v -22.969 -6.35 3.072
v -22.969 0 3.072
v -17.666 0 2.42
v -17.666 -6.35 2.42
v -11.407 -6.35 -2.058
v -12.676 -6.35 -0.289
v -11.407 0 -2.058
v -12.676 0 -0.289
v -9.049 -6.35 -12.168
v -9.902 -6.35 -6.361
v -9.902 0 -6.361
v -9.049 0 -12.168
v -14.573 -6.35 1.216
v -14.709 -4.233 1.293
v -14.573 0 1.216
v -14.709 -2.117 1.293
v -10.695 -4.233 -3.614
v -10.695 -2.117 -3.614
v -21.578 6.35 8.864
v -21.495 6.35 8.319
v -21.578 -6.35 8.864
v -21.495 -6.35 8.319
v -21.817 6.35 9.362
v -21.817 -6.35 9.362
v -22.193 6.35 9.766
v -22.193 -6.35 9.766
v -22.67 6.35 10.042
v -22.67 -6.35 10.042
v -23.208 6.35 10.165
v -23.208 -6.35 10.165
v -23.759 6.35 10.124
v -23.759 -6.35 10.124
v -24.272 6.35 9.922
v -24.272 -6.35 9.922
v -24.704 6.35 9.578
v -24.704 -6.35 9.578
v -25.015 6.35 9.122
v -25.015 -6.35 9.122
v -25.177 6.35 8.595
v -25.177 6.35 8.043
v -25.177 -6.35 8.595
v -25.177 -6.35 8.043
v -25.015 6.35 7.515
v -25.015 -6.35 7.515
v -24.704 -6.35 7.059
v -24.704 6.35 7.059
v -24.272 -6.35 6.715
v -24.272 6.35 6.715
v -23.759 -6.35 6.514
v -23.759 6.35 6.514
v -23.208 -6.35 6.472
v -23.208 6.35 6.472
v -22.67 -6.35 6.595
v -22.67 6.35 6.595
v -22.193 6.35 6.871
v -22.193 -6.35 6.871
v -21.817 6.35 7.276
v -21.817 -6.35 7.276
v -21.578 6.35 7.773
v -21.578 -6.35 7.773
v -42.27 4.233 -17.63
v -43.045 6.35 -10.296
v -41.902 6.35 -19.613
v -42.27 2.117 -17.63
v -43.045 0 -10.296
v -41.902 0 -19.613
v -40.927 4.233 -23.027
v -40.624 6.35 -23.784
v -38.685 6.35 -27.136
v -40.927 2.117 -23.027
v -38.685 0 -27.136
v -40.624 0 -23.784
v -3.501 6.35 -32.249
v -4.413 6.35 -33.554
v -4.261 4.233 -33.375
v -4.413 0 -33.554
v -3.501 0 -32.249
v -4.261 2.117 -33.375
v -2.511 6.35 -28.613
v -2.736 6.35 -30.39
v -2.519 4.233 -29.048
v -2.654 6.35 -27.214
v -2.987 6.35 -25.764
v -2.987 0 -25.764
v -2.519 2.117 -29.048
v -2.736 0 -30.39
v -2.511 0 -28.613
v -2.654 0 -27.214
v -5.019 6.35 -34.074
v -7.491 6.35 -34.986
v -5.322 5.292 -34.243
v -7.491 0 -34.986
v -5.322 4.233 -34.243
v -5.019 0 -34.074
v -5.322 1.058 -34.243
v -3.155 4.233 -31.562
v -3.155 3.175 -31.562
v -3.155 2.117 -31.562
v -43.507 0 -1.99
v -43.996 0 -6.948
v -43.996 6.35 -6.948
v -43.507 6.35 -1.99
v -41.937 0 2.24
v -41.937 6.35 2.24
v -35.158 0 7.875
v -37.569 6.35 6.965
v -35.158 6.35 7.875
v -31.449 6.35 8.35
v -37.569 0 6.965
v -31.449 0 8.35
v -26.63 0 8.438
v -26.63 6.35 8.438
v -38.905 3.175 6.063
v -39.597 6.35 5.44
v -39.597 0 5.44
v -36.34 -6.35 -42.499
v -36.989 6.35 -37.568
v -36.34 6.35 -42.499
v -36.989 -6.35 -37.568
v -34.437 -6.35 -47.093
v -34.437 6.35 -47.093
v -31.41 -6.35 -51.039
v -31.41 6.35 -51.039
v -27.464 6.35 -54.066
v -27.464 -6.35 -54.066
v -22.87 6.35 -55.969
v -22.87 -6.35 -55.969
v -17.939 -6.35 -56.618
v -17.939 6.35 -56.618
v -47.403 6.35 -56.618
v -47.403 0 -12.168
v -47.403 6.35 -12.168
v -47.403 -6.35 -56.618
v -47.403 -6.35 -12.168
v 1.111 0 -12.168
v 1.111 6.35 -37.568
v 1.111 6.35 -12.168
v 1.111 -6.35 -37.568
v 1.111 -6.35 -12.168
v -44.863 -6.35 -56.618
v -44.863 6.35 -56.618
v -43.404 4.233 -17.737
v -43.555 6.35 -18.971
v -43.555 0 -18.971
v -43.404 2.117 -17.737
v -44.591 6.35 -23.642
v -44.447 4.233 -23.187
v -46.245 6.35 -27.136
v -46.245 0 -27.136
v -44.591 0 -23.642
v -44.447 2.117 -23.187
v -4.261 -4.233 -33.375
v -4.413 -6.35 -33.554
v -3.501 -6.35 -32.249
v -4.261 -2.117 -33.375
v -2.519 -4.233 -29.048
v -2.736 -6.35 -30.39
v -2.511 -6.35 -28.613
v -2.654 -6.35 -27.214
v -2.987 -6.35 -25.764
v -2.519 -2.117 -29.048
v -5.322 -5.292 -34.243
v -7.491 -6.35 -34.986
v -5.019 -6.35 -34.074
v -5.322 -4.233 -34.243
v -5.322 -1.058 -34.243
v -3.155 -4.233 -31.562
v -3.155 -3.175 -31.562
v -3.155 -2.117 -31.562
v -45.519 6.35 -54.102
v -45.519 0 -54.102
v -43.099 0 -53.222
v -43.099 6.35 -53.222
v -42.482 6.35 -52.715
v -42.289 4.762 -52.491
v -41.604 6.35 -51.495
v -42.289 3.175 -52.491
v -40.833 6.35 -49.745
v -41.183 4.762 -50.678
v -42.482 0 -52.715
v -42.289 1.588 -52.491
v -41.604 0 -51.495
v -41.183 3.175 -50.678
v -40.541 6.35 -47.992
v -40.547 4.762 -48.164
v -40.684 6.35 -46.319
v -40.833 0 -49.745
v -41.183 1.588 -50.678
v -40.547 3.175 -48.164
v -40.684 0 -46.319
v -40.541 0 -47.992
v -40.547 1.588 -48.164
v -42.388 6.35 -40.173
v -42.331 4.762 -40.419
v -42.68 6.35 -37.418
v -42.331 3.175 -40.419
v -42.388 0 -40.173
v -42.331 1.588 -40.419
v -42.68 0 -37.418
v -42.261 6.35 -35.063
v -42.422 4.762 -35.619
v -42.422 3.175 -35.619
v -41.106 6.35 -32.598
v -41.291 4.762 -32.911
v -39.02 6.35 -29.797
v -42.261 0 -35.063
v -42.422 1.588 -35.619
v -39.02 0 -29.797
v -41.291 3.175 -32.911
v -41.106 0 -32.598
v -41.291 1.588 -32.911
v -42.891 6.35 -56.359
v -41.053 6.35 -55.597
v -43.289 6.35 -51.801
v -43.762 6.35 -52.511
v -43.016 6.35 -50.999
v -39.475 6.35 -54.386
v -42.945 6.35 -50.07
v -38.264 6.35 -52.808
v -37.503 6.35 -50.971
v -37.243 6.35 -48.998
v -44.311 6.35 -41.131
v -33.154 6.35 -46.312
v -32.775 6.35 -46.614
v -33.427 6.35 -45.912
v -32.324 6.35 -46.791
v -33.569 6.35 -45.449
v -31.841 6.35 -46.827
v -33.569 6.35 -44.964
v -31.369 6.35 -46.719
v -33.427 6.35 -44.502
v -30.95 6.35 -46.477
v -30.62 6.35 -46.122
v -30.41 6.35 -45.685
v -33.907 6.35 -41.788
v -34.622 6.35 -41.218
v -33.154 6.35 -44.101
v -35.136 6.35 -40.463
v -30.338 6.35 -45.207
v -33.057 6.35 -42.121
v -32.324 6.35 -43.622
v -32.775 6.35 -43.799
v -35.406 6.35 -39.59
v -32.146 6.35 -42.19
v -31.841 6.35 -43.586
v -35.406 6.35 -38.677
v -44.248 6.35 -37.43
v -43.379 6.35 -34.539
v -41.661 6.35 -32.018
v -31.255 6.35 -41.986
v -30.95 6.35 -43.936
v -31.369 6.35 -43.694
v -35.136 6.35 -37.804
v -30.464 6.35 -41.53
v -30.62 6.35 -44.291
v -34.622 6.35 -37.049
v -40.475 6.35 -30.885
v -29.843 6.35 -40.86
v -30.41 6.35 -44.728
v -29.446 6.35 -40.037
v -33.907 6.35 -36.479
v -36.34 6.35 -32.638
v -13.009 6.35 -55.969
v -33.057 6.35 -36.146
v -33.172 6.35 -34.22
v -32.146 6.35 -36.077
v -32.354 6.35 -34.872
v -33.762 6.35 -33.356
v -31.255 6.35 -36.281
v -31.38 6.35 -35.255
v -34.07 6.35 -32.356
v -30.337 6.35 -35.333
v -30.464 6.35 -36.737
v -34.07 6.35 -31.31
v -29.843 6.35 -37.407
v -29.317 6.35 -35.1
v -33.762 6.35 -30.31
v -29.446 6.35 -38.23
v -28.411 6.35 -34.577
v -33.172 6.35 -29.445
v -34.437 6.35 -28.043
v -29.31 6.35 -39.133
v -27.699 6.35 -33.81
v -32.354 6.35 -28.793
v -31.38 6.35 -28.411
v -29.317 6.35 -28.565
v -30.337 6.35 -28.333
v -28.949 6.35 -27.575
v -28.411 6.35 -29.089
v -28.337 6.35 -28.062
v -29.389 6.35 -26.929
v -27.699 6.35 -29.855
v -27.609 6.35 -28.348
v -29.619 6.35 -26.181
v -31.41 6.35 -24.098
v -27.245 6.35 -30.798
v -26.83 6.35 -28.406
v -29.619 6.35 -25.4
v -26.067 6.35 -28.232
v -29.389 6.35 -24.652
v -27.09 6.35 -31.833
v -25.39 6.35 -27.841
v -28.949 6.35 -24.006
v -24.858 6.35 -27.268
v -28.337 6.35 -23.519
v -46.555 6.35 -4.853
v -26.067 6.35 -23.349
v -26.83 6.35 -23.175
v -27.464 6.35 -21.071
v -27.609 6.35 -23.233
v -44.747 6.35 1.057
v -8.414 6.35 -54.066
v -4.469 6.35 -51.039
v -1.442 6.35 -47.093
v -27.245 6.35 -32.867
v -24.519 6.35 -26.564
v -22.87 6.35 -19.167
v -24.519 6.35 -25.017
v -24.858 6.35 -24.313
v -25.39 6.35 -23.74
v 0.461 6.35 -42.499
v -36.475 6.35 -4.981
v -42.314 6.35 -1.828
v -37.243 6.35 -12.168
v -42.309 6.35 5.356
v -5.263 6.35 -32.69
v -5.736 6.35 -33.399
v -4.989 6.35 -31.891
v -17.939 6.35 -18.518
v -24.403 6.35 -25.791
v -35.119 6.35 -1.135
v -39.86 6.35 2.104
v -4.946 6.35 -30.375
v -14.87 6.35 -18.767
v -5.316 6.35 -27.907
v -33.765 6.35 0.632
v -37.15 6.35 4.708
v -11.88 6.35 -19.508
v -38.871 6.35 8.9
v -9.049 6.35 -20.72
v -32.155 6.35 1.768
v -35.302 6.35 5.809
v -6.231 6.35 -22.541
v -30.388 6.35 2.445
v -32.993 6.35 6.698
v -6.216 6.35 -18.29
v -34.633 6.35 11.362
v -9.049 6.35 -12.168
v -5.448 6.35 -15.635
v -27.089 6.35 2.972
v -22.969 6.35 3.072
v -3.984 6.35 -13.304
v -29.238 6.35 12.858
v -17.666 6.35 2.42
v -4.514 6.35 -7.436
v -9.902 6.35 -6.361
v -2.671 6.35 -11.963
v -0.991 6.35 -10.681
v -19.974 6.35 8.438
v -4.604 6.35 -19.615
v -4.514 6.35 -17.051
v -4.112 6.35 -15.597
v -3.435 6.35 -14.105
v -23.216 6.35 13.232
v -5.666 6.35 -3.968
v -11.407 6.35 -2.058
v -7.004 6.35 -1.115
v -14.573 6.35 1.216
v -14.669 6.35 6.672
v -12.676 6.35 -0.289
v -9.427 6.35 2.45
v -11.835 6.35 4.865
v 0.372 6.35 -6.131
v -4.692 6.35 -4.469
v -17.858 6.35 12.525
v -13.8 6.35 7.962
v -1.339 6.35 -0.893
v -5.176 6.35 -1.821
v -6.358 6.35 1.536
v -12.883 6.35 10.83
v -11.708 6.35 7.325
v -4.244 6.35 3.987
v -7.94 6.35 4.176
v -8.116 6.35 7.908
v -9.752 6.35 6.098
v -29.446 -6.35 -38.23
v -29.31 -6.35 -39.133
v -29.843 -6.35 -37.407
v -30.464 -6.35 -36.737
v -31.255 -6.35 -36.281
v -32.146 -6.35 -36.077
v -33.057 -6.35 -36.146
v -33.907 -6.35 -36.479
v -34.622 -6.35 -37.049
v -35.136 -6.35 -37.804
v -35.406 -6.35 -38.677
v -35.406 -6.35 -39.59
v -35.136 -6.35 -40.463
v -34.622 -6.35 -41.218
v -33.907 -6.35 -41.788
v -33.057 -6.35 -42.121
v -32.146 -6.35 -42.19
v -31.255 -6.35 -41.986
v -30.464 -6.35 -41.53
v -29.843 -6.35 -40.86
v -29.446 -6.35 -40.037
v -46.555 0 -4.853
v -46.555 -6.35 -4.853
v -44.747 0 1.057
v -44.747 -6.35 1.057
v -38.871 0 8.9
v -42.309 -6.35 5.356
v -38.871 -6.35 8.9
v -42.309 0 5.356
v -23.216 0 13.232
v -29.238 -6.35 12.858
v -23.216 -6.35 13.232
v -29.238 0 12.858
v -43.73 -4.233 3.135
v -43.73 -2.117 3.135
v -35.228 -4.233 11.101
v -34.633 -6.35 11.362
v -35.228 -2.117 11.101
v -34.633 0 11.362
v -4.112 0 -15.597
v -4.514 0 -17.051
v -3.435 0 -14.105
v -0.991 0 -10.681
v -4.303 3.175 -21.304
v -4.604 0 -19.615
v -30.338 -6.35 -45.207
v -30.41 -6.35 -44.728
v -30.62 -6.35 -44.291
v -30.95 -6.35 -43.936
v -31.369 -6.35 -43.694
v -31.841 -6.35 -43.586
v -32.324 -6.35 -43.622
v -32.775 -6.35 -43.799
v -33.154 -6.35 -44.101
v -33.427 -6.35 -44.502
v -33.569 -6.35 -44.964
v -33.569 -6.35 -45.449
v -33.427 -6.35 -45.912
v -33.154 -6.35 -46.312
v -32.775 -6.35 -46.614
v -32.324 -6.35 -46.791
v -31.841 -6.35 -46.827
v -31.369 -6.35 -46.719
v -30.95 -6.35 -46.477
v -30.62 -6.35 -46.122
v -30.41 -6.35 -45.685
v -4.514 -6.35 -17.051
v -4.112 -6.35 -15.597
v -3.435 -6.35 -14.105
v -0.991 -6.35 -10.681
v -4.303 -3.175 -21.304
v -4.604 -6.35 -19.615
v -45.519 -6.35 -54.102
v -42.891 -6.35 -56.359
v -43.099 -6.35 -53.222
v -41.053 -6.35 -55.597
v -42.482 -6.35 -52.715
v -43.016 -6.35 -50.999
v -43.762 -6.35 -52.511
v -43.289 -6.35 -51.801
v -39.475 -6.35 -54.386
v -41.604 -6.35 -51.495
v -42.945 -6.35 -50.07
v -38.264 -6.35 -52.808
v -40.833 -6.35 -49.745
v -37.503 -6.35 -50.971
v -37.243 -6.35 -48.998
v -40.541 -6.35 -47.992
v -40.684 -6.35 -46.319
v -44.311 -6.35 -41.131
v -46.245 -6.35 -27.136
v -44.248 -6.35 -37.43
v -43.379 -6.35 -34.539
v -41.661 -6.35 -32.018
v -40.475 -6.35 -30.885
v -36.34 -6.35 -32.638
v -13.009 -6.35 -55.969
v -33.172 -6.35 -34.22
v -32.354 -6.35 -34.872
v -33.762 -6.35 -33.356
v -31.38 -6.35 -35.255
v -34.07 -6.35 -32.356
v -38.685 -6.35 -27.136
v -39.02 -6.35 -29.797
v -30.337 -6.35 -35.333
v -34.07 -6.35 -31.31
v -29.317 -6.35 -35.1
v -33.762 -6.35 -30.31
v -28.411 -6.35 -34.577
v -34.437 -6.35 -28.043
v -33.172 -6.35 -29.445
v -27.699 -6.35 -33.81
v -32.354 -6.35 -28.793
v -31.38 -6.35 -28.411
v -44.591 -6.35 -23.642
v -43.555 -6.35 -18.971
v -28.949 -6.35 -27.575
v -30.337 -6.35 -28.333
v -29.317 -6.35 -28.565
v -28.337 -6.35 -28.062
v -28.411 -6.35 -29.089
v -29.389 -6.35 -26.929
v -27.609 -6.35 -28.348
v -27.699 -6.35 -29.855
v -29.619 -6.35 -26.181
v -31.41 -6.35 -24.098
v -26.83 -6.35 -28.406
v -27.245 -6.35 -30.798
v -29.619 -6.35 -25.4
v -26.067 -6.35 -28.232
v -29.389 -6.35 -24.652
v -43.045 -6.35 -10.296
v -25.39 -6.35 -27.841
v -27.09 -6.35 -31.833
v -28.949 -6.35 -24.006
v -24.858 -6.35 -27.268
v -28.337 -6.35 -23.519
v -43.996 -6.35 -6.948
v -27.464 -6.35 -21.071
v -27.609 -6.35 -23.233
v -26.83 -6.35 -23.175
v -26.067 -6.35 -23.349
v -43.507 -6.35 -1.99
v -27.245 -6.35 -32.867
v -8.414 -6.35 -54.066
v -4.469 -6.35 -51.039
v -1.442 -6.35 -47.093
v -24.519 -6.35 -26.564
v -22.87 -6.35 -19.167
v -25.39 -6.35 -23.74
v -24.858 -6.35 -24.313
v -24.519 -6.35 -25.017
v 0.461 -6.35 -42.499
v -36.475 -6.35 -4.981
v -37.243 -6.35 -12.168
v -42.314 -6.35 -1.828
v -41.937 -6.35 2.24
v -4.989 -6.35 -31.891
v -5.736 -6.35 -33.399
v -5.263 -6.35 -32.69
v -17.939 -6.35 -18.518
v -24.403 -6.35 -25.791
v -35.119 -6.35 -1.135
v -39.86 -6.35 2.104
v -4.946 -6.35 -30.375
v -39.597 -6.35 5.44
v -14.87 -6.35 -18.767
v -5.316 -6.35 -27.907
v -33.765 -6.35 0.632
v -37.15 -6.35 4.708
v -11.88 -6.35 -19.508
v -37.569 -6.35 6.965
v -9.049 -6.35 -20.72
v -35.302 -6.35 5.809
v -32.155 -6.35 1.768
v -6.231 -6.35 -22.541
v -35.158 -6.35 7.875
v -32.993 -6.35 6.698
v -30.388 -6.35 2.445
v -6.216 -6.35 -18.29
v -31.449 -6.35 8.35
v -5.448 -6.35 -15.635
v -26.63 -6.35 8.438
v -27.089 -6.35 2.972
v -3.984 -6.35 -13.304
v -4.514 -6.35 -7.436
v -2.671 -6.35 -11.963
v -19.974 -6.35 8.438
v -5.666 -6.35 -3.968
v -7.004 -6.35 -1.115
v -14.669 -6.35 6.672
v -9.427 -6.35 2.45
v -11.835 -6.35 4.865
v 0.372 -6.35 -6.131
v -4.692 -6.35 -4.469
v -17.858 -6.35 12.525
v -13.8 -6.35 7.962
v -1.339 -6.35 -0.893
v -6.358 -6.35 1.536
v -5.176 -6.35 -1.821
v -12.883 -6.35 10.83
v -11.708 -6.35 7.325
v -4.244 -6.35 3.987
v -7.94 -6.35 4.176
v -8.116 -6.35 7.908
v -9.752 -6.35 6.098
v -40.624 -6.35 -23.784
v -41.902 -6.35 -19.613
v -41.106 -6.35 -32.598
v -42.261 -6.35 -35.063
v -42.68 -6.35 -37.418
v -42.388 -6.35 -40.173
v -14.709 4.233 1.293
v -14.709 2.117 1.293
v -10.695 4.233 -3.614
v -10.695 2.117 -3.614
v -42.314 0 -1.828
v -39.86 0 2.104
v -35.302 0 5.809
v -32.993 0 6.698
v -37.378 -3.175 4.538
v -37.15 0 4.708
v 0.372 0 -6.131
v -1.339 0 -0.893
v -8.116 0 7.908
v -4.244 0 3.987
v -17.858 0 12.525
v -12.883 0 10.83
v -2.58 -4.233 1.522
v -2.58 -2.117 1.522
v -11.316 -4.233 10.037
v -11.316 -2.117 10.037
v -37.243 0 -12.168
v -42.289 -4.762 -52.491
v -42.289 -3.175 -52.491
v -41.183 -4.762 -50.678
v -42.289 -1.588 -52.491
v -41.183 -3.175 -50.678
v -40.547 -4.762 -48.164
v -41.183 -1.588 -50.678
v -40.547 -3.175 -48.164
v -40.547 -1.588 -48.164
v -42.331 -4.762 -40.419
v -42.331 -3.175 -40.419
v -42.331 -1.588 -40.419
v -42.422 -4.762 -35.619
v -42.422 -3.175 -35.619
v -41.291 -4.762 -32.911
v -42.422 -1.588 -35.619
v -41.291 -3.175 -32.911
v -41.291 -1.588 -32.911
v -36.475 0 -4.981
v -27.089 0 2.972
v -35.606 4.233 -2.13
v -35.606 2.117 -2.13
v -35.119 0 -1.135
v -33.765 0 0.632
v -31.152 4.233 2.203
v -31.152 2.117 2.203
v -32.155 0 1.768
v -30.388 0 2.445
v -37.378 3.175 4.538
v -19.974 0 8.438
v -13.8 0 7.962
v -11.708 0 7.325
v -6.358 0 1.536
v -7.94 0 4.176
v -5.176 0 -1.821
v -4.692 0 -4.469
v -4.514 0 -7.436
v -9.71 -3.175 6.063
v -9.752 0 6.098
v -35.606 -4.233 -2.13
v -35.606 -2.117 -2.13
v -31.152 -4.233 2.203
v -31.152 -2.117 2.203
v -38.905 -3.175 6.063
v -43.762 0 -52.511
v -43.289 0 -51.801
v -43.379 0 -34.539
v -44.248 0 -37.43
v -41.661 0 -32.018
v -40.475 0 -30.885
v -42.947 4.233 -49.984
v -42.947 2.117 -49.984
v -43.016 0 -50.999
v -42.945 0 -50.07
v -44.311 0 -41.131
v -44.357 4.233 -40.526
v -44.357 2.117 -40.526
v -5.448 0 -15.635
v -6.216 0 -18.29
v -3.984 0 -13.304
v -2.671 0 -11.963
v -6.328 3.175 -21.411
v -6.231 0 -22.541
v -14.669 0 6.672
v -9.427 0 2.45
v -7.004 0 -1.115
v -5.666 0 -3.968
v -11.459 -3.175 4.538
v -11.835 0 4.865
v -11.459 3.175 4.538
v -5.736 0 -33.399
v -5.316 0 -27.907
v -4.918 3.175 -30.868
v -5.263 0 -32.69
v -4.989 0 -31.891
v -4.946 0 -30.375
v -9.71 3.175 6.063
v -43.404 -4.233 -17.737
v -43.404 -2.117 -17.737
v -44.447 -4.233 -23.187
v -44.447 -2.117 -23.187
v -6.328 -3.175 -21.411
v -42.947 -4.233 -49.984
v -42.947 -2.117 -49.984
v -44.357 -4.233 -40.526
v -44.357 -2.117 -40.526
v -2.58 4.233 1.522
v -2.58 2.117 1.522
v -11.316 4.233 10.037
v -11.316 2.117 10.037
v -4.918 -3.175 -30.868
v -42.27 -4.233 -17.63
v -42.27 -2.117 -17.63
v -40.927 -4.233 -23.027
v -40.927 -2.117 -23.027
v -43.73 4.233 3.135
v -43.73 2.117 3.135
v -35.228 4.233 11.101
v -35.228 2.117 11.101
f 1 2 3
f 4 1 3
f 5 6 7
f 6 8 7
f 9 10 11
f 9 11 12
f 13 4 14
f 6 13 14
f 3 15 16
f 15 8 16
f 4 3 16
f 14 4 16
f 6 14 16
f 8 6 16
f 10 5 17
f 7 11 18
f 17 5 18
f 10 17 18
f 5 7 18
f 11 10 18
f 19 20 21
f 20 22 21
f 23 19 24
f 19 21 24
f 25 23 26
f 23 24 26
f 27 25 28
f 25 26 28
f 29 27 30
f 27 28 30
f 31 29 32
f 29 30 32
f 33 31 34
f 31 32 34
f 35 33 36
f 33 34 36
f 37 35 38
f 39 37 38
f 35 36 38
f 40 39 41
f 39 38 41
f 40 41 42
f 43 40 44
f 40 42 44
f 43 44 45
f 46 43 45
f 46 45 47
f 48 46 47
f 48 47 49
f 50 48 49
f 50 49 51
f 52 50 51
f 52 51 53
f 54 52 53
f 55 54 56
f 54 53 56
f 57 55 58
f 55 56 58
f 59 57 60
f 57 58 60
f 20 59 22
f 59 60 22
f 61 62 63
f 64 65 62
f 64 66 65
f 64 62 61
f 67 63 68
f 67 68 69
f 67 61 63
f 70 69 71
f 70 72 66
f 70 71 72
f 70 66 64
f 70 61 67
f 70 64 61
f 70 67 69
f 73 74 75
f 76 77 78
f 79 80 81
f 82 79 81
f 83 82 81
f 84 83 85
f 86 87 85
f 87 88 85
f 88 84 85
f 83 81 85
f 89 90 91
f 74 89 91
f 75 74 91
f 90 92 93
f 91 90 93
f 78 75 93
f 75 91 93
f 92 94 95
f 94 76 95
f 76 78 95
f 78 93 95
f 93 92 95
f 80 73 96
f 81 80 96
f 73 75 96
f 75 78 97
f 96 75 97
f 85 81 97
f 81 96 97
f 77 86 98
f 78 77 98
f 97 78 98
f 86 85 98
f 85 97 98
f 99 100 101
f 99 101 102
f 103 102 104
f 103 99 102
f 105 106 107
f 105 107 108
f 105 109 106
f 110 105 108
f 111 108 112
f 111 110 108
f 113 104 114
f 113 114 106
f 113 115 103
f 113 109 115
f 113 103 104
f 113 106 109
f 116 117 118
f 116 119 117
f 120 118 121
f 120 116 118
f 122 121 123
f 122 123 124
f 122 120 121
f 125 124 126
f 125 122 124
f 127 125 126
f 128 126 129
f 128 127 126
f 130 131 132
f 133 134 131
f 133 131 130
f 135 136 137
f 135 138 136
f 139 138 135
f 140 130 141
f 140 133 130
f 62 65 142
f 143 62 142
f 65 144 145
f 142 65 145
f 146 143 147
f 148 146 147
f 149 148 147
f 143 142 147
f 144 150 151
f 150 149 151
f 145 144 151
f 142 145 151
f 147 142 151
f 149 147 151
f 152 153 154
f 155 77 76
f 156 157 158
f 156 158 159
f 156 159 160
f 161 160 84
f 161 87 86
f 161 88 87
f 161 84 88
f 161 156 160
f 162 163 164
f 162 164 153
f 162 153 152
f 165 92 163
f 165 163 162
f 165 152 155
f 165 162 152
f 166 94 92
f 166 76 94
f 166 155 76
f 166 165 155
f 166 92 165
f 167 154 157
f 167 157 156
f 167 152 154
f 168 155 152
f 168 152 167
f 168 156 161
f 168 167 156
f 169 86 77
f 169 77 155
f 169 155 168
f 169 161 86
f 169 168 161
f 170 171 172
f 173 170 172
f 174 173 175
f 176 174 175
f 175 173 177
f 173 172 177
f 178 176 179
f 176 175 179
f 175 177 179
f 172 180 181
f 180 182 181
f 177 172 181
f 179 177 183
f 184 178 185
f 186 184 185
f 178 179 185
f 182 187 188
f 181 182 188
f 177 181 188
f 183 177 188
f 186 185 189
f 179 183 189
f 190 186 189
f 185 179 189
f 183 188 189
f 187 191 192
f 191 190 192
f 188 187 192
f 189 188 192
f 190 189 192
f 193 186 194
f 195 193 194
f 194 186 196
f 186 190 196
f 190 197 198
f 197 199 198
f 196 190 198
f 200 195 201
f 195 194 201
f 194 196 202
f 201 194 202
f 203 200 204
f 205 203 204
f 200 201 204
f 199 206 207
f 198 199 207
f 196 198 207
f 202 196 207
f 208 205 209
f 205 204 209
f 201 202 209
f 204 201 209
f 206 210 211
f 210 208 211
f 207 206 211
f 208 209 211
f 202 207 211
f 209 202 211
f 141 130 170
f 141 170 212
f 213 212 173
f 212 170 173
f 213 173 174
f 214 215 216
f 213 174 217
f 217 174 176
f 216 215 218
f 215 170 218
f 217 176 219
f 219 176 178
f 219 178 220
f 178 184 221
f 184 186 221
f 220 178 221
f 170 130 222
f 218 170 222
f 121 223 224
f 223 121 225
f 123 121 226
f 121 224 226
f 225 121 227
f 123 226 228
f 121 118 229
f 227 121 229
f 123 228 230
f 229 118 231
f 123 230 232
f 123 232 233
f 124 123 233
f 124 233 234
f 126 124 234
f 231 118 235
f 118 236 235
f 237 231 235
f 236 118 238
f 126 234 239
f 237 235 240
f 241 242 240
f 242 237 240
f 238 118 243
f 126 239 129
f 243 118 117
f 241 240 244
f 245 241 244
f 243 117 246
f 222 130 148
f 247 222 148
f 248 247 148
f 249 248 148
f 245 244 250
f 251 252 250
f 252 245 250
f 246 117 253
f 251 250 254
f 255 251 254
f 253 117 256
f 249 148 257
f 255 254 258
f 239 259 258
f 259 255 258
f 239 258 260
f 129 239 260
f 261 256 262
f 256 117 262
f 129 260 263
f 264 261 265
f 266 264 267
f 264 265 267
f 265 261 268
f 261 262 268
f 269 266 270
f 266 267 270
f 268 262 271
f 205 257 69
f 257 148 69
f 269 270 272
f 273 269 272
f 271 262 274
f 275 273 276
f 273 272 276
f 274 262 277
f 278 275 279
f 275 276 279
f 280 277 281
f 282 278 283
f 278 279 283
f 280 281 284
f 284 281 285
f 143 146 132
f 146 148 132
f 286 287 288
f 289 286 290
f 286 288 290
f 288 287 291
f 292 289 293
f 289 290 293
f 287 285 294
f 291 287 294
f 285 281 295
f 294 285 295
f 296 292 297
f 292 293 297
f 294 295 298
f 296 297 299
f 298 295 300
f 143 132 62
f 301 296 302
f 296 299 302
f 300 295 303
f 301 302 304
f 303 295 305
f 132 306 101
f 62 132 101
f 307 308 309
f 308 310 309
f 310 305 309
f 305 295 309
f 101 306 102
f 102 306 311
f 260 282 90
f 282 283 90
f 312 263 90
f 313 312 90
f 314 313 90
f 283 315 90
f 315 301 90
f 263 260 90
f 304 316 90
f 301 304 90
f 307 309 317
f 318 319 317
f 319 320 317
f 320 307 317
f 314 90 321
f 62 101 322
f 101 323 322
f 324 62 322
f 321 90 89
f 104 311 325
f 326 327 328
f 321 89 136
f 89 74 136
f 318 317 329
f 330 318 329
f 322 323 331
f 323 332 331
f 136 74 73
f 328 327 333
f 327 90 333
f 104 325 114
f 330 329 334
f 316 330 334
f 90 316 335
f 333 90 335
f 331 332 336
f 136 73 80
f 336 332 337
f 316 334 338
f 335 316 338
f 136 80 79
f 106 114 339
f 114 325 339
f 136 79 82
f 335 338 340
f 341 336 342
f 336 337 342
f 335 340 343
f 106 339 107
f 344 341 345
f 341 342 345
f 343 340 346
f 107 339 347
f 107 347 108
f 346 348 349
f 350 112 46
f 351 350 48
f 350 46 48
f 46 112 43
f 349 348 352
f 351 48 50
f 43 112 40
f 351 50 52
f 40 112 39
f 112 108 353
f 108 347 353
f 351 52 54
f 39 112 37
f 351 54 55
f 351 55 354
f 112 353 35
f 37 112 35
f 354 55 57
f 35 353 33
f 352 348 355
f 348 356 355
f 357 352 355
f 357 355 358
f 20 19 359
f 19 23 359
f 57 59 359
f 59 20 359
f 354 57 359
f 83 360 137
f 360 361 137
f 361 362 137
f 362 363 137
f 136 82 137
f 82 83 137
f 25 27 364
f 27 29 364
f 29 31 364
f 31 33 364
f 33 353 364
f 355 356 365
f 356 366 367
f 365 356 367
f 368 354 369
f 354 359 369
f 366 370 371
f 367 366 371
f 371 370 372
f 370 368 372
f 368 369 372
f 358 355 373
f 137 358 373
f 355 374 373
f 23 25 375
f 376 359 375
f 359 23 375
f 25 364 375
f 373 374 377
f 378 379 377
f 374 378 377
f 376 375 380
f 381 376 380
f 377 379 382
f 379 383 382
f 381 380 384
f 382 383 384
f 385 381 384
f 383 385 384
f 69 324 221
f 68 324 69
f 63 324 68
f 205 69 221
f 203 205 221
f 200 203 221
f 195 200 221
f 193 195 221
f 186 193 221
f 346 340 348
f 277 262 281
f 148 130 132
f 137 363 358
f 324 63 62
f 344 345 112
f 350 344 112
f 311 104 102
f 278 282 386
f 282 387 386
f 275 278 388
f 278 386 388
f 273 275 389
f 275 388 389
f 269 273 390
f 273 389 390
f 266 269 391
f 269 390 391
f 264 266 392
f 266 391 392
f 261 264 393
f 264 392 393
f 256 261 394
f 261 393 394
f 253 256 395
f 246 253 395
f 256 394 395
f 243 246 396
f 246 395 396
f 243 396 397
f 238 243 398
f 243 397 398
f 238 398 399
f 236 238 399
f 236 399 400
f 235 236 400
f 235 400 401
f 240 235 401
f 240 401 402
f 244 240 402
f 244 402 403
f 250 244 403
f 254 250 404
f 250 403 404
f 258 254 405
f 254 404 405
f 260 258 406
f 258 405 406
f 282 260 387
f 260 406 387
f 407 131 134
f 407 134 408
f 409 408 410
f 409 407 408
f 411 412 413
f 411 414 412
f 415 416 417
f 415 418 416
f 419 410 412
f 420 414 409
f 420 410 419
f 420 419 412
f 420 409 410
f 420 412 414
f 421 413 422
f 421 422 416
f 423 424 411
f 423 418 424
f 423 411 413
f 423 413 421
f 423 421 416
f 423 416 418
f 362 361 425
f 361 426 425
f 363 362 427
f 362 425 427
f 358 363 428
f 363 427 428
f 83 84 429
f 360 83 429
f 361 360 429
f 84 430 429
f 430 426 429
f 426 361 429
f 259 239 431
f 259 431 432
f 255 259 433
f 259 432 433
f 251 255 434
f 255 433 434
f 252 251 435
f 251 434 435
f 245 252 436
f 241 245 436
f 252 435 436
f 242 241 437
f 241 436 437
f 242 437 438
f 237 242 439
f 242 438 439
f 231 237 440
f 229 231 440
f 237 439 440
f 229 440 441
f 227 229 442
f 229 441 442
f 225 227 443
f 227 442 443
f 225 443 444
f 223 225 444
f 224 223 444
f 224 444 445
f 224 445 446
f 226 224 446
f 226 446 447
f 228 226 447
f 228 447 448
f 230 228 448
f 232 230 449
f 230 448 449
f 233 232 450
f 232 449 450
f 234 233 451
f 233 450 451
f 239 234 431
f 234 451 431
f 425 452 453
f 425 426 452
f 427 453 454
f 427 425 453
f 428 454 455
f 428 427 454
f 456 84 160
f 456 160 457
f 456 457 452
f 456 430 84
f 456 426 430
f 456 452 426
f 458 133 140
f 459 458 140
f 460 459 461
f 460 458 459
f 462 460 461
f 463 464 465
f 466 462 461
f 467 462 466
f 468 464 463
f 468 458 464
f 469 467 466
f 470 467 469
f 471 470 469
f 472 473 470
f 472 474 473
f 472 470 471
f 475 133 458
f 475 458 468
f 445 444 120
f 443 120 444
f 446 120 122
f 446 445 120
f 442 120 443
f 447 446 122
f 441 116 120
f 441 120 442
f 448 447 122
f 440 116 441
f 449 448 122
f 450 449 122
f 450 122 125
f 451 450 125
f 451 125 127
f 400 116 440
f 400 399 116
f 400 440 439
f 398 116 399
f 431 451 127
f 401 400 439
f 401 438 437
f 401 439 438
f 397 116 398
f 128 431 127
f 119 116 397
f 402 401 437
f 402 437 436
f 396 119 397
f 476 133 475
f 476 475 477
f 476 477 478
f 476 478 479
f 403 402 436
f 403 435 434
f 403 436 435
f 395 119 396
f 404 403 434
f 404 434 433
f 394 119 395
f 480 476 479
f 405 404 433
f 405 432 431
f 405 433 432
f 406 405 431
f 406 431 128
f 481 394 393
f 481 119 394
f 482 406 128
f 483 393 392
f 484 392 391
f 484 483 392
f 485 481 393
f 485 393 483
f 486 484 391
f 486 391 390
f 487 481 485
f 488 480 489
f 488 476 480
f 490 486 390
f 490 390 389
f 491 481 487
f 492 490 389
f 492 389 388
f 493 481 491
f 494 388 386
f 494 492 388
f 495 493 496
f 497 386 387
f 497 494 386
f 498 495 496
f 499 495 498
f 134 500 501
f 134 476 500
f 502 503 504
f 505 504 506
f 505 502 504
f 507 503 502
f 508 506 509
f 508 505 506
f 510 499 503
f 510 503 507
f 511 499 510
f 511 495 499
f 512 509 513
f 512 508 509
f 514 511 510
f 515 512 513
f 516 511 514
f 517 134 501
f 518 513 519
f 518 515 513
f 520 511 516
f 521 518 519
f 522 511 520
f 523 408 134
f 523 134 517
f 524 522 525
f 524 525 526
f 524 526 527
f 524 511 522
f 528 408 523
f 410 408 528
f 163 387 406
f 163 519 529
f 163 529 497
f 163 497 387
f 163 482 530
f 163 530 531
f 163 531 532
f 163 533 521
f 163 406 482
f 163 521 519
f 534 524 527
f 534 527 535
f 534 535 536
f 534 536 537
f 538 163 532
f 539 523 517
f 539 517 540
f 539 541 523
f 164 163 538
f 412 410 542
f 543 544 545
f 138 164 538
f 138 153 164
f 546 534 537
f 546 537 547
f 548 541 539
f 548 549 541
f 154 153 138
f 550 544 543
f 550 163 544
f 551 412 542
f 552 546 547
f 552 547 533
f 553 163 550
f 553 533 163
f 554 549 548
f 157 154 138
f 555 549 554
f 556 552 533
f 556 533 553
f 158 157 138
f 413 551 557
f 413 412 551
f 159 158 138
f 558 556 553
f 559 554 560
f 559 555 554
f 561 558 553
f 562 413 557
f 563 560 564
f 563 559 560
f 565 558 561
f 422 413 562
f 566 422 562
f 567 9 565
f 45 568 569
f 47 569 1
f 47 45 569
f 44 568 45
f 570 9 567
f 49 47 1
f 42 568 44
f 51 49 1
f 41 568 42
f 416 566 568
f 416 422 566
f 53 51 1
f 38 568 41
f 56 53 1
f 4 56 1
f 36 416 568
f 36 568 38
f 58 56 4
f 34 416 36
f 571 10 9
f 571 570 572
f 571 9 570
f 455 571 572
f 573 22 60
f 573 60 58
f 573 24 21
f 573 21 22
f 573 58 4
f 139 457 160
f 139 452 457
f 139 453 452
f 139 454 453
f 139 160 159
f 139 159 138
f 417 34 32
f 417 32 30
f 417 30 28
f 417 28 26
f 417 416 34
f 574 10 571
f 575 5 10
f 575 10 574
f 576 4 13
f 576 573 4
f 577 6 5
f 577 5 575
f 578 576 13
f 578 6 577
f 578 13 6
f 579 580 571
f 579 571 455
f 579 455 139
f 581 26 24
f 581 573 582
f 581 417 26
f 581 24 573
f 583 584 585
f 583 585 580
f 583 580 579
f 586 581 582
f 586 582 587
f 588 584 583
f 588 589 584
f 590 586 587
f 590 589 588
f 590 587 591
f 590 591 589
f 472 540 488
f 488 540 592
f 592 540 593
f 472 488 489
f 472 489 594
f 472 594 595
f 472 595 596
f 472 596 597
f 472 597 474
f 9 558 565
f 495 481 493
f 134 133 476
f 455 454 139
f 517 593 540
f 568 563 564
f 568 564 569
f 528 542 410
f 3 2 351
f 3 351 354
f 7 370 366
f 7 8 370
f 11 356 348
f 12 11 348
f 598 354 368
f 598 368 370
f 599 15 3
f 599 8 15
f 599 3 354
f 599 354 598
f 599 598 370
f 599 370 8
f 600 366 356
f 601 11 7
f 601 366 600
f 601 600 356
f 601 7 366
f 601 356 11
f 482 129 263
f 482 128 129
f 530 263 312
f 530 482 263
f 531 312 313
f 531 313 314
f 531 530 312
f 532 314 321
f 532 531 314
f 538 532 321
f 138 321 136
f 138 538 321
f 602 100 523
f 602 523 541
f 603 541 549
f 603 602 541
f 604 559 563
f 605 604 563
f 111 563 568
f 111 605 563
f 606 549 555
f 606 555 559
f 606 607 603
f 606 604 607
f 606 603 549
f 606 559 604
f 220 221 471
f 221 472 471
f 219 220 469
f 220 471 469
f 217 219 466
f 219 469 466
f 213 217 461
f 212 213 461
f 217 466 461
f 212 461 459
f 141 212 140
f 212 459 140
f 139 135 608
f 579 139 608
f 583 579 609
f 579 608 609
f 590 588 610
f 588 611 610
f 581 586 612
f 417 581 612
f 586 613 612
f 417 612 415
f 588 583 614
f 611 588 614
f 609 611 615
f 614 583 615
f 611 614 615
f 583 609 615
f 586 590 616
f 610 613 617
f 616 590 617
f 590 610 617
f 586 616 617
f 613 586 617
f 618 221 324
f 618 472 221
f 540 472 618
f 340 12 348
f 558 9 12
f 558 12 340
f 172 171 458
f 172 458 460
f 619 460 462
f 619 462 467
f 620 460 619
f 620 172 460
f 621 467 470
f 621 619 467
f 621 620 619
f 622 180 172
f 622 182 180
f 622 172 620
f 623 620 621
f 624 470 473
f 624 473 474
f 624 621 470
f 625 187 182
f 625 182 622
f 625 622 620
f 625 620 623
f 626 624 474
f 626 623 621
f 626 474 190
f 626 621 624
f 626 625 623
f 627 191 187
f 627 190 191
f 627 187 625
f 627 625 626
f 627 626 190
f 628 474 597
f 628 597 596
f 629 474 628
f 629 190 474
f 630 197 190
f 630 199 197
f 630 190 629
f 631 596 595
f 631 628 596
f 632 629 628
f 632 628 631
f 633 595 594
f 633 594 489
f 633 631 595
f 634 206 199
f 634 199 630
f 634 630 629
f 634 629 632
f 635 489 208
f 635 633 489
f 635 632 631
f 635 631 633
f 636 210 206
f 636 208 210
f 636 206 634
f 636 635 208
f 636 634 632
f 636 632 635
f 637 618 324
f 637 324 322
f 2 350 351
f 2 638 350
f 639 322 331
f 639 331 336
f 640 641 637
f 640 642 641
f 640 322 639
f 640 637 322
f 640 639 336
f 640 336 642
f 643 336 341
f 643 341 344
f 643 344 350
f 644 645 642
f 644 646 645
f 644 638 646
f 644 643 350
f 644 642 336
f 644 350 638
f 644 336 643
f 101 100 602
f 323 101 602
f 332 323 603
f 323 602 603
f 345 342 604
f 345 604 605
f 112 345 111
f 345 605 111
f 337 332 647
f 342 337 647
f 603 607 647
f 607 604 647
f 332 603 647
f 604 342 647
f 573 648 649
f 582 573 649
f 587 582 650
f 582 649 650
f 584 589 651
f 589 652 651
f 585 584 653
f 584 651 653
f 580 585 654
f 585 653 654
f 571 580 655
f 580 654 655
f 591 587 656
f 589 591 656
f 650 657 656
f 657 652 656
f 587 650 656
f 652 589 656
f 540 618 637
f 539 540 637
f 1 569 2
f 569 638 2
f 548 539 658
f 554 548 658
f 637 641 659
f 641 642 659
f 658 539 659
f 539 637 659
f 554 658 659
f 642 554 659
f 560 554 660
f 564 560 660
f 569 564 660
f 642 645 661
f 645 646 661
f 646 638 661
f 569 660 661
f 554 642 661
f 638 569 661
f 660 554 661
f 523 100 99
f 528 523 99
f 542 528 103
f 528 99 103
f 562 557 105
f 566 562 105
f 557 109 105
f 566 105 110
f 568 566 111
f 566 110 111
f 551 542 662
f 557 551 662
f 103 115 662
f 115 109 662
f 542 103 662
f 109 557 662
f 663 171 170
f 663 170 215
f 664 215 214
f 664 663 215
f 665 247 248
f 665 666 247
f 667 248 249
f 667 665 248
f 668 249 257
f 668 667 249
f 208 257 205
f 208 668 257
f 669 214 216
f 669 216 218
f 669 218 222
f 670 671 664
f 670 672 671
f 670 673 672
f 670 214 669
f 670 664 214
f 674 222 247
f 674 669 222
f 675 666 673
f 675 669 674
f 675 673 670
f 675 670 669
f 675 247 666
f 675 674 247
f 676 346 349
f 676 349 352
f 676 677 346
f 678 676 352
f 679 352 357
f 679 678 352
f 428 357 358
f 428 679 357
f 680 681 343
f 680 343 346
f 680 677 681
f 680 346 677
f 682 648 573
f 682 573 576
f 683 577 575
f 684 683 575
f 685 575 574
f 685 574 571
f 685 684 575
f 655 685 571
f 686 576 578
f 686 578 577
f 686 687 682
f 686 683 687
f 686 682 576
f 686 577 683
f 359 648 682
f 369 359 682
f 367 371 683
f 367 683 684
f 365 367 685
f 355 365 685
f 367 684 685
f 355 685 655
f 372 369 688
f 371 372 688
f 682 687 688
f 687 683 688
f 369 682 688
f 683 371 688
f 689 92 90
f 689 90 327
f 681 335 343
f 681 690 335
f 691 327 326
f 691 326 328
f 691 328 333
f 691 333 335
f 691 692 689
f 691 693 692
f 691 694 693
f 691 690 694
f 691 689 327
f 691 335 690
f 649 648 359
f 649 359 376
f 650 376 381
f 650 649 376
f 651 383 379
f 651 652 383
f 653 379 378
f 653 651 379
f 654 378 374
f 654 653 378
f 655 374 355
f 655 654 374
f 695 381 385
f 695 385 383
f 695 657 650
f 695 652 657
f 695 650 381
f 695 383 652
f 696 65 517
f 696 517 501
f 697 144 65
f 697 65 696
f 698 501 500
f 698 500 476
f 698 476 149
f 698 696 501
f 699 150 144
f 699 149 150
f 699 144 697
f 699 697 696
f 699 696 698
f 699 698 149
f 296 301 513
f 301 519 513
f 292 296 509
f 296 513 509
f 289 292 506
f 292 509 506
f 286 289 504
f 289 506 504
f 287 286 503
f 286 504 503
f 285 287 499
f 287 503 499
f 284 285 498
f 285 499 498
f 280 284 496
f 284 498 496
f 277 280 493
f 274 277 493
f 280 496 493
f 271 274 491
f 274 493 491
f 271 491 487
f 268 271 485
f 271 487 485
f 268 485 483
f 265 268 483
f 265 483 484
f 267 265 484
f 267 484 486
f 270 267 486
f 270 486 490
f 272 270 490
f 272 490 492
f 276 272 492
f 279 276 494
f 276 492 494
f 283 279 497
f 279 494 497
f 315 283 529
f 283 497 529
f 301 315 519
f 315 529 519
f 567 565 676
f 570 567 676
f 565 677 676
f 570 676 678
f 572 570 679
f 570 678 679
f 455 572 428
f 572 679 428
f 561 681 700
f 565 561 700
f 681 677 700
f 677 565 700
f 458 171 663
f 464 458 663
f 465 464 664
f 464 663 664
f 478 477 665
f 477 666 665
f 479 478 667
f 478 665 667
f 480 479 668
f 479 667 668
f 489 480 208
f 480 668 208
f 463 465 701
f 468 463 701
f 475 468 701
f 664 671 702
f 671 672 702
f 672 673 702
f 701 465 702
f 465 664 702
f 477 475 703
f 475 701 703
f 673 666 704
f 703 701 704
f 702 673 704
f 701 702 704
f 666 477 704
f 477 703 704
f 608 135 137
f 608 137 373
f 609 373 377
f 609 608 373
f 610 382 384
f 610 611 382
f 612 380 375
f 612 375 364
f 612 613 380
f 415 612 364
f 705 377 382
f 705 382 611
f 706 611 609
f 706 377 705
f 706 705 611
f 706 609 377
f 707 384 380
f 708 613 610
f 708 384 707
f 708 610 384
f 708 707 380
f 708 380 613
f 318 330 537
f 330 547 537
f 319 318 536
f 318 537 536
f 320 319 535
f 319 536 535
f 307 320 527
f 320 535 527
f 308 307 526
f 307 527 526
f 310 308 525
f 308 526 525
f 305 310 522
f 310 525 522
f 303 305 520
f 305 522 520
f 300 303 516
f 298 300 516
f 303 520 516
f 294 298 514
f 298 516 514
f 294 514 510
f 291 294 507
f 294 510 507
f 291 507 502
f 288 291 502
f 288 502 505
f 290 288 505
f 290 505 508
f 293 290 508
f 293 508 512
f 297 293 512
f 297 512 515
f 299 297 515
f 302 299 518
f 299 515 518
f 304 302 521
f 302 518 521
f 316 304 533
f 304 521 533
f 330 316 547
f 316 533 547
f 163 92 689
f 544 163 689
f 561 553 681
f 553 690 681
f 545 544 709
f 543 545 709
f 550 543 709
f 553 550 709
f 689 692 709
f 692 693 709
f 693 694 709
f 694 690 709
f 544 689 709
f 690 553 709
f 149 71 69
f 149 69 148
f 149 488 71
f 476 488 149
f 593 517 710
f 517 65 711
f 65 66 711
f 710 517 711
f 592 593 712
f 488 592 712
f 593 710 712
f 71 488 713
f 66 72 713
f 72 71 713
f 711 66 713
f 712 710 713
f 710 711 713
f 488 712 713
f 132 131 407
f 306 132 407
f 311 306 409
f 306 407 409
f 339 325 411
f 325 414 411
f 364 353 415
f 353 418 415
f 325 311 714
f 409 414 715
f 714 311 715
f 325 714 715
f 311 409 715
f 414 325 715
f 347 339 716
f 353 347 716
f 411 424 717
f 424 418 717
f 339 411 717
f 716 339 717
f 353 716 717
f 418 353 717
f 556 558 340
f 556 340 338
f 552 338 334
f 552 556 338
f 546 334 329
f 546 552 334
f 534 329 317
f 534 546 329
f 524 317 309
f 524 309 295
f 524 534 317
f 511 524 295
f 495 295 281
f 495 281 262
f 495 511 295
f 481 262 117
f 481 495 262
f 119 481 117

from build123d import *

# Parameters (mm, degrees)
F1_DEPTH = 6.35
F2_R     = 7.62
F3_R     = 1.851317794
F3_R_2   = 2.623048948
F3_R_3   = 3.5099243314
F3_R_4   = 3.0648100187
F3_R_5   = 1.624839295
F4_DEPTH = 12.7


# Not quite as in the source:
# - a feature names something its author has since deleted; it is built from what else it names


with BuildPart() as f1:
    # F0 (on Front) → F1 (new body, symmetric)
    with BuildSketch(Plane.XZ):
        with BuildLine():
            Line((-47.4034676004, -12.1683157229), (-47.4034676004, -56.6183157229))
            Line((-47.4034676004, -56.6183157229), (-37.2434676004, -56.6183157229))
            Line((-37.2434676004, -56.6183157229), (-37.2434676004, -12.1683157229))
            add(Edge.make_bspline(
                [(-37.2434676004, -12.1683157229), (-36.7095838945, 1.4708520701), (-33.3203151822, 3.1873958426), (-22.9693437804, 3.0716842771)],
                knots=[0, 0, 0, 0, 20.8808096306, 20.8808096306, 20.8808096306, 20.8808096306], degree=3))
            add(Edge.make_bspline(
                [(-22.9693437804, 3.0716842771), (-11.9594718681, 2.6847659899), (-10.1360433424, -1.6166193699), (-9.0494676004, -12.1683158262)],
                knots=[0, 0, 0, 0, 20.6402654057, 20.6402654057, 20.6402654057, 20.6402654057], degree=3))
            Line((-9.0494676004, -12.1683158262), (-9.0494676004, -20.7198617879))
            ThreePointArc((-9.0494676004, -20.7198617879), (-7.6000300221, -21.5683616428), (-6.2309603269, -22.5412282663))
            add(Edge.make_bspline(
                [(-6.2309603269, -22.5412282663), (-6.2723652172, -22.1636683346), (-6.6533718861, -17.8378431816), (-5.6407446666, -13.777271871), (-0.9912915077, -10.6814840494)],
                knots=[0.5669230938, 0.5669230938, 0.5669230938, 0.5669230938, 0.6047158912, 1, 1, 1, 1], degree=3))
            add(Edge.make_bspline(
                [(-2.9873109532, -25.7642693151), (-3.3866343808, -24.3019783121), (-5.124946874, -19.6083809219), (-4.8990877844, -15.1703206189), (-0.9912915077, -10.6814840494)],
                knots=[0.5181753665, 0.5181753665, 0.5181753665, 0.5181753665, 0.6734400418, 1, 1, 1, 1], degree=3))
            ThreePointArc((-2.9873109532, -25.7642693151), (0.0569359866, -31.3207595659), (1.1105323996, -37.5683157229))
            Line((1.1105323996, -37.5683157229), (1.1105323996, -12.1683157229))
            add(Edge.make_bspline(
                [(1.1105323996, -12.1683157229), (0.5705629619, 4.0617453953), (-10.3604181223, 12.7446337565), (-23.2162306761, 13.2316842771)],
                knots=[0, 0, 0, 0, 35.1703198982, 35.1703198982, 35.1703198982, 35.1703198982], degree=3))
            add(Edge.make_bspline(
                [(-47.4034676004, -12.1683157229), (-46.5849920508, 7.3050484799), (-36.5418703402, 13.5184679613), (-23.2162306761, 13.2316842771)],
                knots=[0, 0, 0, 0, 35.0739565779, 35.0739565779, 35.0739565779, 35.0739565779], degree=3))
        make_face()
        with BuildLine():
            add(Edge.make_bspline(
                [(-45.5194190145, -54.1016533971), (-43.4073472429, -53.4859708194), (-42.3767122517, -53.0275311605), (-39.4416086551, -47.8736285865), (-43.2098006647, -39.8360561852), (-42.9273473132, -34.2859363798), (-39.0195510365, -29.7970998103)],
                knots=[0, 0, 0, 0, 0.1860018813, 0.3974429686, 0.6734400418, 1, 1, 1, 1], degree=3))
            add(Edge.make_bspline(
                [(-45.5194190145, -54.1016533971), (-43.4073472429, -52.4910938487), (-42.1962339672, -50.3443092376), (-45.4188846713, -39.9097980212), (-43.6690041954, -32.8928876319), (-39.0195510365, -29.7970998103)],
                knots=[0, 0, 0, 0, 0.2516171716, 0.6047158912, 1, 1, 1, 1], degree=3))
        make_face(mode=Mode.SUBTRACT)
        with BuildLine():
            add(Edge.make_bspline(
                [(-43.0450886488, -10.2955098264), (-43.0850870907, -18.8955254853), (-44.0450869501, -23.7755347043), (-46.2450906634, -27.1355397999)],
                knots=[0, 0, 0, 0, 17.1413716605, 17.1413716605, 17.1413716605, 17.1413716605], degree=3))
            add(Edge.make_bspline(
                [(-43.0450886488, -10.2955098264), (-42.4450859427, -18.8155258074), (-41.4850823581, -23.4555341303), (-38.685079664, -27.1355397999)],
                knots=[0, 0, 0, 0, 17.395294992, 17.395294992, 17.395294992, 17.395294992], degree=3))
            Line((-38.685079664, -27.1355397999), (-46.2450906634, -27.1355397999))
        make_face(mode=Mode.SUBTRACT)
        with BuildLine():
            add(Edge.make_bspline(
                [(-43.9962111413, -6.9482689141), (-42.8800281093, -1.4789610887), (-37.594435646, 6.055033296), (-32.2294885174, 6.9111710616), (-26.6296397895, 8.4384027869)],
                knots=[0, 0, 0, 0, 0.5184862256, 1, 1, 1, 1], degree=3))
            add(Edge.make_bspline(
                [(-43.9962111413, -6.9482689141), (-44.1630539416, -1.2757268376), (-39.7049183871, 8.2866771022), (-32.6861925423, 8.4215123206), (-26.6296397895, 8.4384027869)],
                knots=[0, 0, 0, 0, 0.513875061, 1, 1, 1, 1], degree=3))
        make_face(mode=Mode.SUBTRACT)
        with BuildLine():
            add(Edge.make_bspline(
                [(-19.9744962156, 8.4384027869), (-15.0681919771, 7.110938792), (-11.4060719241, 5.2750660976), (-6.2541036922, -1.0550173553), (-4.5138360001, -7.4359978316)],
                knots=[0, 0, 0, 0, 0.4513191083, 1, 1, 1, 1], degree=3))
            add(Edge.make_bspline(
                [(-19.9744962156, 8.4384027869), (-14.4520029301, 8.3067857058), (-9.1414830202, 7.6395398298), (-4.5325819981, -0.7140918586), (-4.5138360001, -7.4359978316)],
                knots=[0, 0, 0, 0, 0.4604709536, 1, 1, 1, 1], degree=3))
        make_face(mode=Mode.SUBTRACT)
        with BuildLine():
            ThreePointArc((-17.9394676004, -18.5183157229), (-31.409851782, -24.0979315413), (-36.9894676004, -37.5683157229))
            Line((-36.9894676004, -37.5683157229), (-17.9394676004, -37.5683157229))
            Line((-17.9394676004, -37.5683157229), (-17.9394676004, -18.5183157229))
        make_face()
        with BuildLine():
            ThreePointArc((-17.9394676004, -56.6183157229), (-4.4690834188, -51.0386999045), (1.1105323996, -37.5683157229))
            ThreePointArc((1.1105323996, -37.5683157229), (0.0569359866, -31.3207595659), (-2.9873109532, -25.7642693151))
            add(Edge.make_bspline(
                [(-7.4911594857, -34.9860376362), (-5.3790877141, -34.3703550585), (-4.3484527229, -33.9119153996), (-2.0900506569, -29.9462685874), (-2.6768006917, -26.9013334848), (-2.9873109532, -25.7642693151)],
                knots=[0, 0, 0, 0, 0.1860018813, 0.3974429686, 0.5181753665, 0.5181753665, 0.5181753665, 0.5181753665], degree=3))
            add(Edge.make_bspline(
                [(-7.4911594857, -34.9860376362), (-5.3790877141, -33.3754780878), (-4.243665121, -31.362860607), (-5.8855186547, -25.6912169104), (-6.2309603269, -22.5412282663)],
                knots=[0, 0, 0, 0, 0.2516171716, 0.5669230938, 0.5669230938, 0.5669230938, 0.5669230938], degree=3))
            ThreePointArc((-6.2309603269, -22.5412282663), (-7.6000300221, -21.5683616428), (-9.0494676004, -20.7198617879))
            ThreePointArc((-9.0494676004, -20.7198617879), (-13.3601962316, -19.0768913935), (-17.9394676004, -18.5183157229))
            Line((-17.9394676004, -18.5183157229), (-17.9394676004, -37.5683157229))
            Line((-17.9394676004, -37.5683157229), (-17.9394676004, -56.6183157229))
        make_face()
        with BuildLine():
            ThreePointArc((-36.9894676004, -37.5683157229), (-31.409851782, -51.0386999045), (-17.9394676004, -56.6183157229))
            Line((-17.9394676004, -56.6183157229), (-17.9394676004, -37.5683157229))
            Line((-17.9394676004, -37.5683157229), (-36.9894676004, -37.5683157229))
        make_face()
    extrude(amount=F1_DEPTH, both=True)

    # F2
    f2_edges = [f1.edges().sort_by_distance(p)[0] for p in [
        (-37.243468, 0, -56.618316),
    ]]
    fillet(f2_edges, radius=F2_R)

    # F3 (on Front) → F4 (cut, symmetric)
    with BuildSketch(Plane.XZ):
        with Locations((-23.3467891812, 8.3186188713)):
            Circle(F3_R)
        with Locations((-27.0257256925, -25.7905125618)):
            Circle(F3_R_2)
        with Locations((-30.5994562805, -31.8327024579)):
            Circle(F3_R_3)
        with Locations((-32.374959439, -39.1334928572)):
            Circle(F3_R_4)
        with Locations((-31.9626331329, -45.2065691352)):
            Circle(F3_R_5)
    extrude(amount=F4_DEPTH, both=True, mode=Mode.SUBTRACT)


solid = f1.part
